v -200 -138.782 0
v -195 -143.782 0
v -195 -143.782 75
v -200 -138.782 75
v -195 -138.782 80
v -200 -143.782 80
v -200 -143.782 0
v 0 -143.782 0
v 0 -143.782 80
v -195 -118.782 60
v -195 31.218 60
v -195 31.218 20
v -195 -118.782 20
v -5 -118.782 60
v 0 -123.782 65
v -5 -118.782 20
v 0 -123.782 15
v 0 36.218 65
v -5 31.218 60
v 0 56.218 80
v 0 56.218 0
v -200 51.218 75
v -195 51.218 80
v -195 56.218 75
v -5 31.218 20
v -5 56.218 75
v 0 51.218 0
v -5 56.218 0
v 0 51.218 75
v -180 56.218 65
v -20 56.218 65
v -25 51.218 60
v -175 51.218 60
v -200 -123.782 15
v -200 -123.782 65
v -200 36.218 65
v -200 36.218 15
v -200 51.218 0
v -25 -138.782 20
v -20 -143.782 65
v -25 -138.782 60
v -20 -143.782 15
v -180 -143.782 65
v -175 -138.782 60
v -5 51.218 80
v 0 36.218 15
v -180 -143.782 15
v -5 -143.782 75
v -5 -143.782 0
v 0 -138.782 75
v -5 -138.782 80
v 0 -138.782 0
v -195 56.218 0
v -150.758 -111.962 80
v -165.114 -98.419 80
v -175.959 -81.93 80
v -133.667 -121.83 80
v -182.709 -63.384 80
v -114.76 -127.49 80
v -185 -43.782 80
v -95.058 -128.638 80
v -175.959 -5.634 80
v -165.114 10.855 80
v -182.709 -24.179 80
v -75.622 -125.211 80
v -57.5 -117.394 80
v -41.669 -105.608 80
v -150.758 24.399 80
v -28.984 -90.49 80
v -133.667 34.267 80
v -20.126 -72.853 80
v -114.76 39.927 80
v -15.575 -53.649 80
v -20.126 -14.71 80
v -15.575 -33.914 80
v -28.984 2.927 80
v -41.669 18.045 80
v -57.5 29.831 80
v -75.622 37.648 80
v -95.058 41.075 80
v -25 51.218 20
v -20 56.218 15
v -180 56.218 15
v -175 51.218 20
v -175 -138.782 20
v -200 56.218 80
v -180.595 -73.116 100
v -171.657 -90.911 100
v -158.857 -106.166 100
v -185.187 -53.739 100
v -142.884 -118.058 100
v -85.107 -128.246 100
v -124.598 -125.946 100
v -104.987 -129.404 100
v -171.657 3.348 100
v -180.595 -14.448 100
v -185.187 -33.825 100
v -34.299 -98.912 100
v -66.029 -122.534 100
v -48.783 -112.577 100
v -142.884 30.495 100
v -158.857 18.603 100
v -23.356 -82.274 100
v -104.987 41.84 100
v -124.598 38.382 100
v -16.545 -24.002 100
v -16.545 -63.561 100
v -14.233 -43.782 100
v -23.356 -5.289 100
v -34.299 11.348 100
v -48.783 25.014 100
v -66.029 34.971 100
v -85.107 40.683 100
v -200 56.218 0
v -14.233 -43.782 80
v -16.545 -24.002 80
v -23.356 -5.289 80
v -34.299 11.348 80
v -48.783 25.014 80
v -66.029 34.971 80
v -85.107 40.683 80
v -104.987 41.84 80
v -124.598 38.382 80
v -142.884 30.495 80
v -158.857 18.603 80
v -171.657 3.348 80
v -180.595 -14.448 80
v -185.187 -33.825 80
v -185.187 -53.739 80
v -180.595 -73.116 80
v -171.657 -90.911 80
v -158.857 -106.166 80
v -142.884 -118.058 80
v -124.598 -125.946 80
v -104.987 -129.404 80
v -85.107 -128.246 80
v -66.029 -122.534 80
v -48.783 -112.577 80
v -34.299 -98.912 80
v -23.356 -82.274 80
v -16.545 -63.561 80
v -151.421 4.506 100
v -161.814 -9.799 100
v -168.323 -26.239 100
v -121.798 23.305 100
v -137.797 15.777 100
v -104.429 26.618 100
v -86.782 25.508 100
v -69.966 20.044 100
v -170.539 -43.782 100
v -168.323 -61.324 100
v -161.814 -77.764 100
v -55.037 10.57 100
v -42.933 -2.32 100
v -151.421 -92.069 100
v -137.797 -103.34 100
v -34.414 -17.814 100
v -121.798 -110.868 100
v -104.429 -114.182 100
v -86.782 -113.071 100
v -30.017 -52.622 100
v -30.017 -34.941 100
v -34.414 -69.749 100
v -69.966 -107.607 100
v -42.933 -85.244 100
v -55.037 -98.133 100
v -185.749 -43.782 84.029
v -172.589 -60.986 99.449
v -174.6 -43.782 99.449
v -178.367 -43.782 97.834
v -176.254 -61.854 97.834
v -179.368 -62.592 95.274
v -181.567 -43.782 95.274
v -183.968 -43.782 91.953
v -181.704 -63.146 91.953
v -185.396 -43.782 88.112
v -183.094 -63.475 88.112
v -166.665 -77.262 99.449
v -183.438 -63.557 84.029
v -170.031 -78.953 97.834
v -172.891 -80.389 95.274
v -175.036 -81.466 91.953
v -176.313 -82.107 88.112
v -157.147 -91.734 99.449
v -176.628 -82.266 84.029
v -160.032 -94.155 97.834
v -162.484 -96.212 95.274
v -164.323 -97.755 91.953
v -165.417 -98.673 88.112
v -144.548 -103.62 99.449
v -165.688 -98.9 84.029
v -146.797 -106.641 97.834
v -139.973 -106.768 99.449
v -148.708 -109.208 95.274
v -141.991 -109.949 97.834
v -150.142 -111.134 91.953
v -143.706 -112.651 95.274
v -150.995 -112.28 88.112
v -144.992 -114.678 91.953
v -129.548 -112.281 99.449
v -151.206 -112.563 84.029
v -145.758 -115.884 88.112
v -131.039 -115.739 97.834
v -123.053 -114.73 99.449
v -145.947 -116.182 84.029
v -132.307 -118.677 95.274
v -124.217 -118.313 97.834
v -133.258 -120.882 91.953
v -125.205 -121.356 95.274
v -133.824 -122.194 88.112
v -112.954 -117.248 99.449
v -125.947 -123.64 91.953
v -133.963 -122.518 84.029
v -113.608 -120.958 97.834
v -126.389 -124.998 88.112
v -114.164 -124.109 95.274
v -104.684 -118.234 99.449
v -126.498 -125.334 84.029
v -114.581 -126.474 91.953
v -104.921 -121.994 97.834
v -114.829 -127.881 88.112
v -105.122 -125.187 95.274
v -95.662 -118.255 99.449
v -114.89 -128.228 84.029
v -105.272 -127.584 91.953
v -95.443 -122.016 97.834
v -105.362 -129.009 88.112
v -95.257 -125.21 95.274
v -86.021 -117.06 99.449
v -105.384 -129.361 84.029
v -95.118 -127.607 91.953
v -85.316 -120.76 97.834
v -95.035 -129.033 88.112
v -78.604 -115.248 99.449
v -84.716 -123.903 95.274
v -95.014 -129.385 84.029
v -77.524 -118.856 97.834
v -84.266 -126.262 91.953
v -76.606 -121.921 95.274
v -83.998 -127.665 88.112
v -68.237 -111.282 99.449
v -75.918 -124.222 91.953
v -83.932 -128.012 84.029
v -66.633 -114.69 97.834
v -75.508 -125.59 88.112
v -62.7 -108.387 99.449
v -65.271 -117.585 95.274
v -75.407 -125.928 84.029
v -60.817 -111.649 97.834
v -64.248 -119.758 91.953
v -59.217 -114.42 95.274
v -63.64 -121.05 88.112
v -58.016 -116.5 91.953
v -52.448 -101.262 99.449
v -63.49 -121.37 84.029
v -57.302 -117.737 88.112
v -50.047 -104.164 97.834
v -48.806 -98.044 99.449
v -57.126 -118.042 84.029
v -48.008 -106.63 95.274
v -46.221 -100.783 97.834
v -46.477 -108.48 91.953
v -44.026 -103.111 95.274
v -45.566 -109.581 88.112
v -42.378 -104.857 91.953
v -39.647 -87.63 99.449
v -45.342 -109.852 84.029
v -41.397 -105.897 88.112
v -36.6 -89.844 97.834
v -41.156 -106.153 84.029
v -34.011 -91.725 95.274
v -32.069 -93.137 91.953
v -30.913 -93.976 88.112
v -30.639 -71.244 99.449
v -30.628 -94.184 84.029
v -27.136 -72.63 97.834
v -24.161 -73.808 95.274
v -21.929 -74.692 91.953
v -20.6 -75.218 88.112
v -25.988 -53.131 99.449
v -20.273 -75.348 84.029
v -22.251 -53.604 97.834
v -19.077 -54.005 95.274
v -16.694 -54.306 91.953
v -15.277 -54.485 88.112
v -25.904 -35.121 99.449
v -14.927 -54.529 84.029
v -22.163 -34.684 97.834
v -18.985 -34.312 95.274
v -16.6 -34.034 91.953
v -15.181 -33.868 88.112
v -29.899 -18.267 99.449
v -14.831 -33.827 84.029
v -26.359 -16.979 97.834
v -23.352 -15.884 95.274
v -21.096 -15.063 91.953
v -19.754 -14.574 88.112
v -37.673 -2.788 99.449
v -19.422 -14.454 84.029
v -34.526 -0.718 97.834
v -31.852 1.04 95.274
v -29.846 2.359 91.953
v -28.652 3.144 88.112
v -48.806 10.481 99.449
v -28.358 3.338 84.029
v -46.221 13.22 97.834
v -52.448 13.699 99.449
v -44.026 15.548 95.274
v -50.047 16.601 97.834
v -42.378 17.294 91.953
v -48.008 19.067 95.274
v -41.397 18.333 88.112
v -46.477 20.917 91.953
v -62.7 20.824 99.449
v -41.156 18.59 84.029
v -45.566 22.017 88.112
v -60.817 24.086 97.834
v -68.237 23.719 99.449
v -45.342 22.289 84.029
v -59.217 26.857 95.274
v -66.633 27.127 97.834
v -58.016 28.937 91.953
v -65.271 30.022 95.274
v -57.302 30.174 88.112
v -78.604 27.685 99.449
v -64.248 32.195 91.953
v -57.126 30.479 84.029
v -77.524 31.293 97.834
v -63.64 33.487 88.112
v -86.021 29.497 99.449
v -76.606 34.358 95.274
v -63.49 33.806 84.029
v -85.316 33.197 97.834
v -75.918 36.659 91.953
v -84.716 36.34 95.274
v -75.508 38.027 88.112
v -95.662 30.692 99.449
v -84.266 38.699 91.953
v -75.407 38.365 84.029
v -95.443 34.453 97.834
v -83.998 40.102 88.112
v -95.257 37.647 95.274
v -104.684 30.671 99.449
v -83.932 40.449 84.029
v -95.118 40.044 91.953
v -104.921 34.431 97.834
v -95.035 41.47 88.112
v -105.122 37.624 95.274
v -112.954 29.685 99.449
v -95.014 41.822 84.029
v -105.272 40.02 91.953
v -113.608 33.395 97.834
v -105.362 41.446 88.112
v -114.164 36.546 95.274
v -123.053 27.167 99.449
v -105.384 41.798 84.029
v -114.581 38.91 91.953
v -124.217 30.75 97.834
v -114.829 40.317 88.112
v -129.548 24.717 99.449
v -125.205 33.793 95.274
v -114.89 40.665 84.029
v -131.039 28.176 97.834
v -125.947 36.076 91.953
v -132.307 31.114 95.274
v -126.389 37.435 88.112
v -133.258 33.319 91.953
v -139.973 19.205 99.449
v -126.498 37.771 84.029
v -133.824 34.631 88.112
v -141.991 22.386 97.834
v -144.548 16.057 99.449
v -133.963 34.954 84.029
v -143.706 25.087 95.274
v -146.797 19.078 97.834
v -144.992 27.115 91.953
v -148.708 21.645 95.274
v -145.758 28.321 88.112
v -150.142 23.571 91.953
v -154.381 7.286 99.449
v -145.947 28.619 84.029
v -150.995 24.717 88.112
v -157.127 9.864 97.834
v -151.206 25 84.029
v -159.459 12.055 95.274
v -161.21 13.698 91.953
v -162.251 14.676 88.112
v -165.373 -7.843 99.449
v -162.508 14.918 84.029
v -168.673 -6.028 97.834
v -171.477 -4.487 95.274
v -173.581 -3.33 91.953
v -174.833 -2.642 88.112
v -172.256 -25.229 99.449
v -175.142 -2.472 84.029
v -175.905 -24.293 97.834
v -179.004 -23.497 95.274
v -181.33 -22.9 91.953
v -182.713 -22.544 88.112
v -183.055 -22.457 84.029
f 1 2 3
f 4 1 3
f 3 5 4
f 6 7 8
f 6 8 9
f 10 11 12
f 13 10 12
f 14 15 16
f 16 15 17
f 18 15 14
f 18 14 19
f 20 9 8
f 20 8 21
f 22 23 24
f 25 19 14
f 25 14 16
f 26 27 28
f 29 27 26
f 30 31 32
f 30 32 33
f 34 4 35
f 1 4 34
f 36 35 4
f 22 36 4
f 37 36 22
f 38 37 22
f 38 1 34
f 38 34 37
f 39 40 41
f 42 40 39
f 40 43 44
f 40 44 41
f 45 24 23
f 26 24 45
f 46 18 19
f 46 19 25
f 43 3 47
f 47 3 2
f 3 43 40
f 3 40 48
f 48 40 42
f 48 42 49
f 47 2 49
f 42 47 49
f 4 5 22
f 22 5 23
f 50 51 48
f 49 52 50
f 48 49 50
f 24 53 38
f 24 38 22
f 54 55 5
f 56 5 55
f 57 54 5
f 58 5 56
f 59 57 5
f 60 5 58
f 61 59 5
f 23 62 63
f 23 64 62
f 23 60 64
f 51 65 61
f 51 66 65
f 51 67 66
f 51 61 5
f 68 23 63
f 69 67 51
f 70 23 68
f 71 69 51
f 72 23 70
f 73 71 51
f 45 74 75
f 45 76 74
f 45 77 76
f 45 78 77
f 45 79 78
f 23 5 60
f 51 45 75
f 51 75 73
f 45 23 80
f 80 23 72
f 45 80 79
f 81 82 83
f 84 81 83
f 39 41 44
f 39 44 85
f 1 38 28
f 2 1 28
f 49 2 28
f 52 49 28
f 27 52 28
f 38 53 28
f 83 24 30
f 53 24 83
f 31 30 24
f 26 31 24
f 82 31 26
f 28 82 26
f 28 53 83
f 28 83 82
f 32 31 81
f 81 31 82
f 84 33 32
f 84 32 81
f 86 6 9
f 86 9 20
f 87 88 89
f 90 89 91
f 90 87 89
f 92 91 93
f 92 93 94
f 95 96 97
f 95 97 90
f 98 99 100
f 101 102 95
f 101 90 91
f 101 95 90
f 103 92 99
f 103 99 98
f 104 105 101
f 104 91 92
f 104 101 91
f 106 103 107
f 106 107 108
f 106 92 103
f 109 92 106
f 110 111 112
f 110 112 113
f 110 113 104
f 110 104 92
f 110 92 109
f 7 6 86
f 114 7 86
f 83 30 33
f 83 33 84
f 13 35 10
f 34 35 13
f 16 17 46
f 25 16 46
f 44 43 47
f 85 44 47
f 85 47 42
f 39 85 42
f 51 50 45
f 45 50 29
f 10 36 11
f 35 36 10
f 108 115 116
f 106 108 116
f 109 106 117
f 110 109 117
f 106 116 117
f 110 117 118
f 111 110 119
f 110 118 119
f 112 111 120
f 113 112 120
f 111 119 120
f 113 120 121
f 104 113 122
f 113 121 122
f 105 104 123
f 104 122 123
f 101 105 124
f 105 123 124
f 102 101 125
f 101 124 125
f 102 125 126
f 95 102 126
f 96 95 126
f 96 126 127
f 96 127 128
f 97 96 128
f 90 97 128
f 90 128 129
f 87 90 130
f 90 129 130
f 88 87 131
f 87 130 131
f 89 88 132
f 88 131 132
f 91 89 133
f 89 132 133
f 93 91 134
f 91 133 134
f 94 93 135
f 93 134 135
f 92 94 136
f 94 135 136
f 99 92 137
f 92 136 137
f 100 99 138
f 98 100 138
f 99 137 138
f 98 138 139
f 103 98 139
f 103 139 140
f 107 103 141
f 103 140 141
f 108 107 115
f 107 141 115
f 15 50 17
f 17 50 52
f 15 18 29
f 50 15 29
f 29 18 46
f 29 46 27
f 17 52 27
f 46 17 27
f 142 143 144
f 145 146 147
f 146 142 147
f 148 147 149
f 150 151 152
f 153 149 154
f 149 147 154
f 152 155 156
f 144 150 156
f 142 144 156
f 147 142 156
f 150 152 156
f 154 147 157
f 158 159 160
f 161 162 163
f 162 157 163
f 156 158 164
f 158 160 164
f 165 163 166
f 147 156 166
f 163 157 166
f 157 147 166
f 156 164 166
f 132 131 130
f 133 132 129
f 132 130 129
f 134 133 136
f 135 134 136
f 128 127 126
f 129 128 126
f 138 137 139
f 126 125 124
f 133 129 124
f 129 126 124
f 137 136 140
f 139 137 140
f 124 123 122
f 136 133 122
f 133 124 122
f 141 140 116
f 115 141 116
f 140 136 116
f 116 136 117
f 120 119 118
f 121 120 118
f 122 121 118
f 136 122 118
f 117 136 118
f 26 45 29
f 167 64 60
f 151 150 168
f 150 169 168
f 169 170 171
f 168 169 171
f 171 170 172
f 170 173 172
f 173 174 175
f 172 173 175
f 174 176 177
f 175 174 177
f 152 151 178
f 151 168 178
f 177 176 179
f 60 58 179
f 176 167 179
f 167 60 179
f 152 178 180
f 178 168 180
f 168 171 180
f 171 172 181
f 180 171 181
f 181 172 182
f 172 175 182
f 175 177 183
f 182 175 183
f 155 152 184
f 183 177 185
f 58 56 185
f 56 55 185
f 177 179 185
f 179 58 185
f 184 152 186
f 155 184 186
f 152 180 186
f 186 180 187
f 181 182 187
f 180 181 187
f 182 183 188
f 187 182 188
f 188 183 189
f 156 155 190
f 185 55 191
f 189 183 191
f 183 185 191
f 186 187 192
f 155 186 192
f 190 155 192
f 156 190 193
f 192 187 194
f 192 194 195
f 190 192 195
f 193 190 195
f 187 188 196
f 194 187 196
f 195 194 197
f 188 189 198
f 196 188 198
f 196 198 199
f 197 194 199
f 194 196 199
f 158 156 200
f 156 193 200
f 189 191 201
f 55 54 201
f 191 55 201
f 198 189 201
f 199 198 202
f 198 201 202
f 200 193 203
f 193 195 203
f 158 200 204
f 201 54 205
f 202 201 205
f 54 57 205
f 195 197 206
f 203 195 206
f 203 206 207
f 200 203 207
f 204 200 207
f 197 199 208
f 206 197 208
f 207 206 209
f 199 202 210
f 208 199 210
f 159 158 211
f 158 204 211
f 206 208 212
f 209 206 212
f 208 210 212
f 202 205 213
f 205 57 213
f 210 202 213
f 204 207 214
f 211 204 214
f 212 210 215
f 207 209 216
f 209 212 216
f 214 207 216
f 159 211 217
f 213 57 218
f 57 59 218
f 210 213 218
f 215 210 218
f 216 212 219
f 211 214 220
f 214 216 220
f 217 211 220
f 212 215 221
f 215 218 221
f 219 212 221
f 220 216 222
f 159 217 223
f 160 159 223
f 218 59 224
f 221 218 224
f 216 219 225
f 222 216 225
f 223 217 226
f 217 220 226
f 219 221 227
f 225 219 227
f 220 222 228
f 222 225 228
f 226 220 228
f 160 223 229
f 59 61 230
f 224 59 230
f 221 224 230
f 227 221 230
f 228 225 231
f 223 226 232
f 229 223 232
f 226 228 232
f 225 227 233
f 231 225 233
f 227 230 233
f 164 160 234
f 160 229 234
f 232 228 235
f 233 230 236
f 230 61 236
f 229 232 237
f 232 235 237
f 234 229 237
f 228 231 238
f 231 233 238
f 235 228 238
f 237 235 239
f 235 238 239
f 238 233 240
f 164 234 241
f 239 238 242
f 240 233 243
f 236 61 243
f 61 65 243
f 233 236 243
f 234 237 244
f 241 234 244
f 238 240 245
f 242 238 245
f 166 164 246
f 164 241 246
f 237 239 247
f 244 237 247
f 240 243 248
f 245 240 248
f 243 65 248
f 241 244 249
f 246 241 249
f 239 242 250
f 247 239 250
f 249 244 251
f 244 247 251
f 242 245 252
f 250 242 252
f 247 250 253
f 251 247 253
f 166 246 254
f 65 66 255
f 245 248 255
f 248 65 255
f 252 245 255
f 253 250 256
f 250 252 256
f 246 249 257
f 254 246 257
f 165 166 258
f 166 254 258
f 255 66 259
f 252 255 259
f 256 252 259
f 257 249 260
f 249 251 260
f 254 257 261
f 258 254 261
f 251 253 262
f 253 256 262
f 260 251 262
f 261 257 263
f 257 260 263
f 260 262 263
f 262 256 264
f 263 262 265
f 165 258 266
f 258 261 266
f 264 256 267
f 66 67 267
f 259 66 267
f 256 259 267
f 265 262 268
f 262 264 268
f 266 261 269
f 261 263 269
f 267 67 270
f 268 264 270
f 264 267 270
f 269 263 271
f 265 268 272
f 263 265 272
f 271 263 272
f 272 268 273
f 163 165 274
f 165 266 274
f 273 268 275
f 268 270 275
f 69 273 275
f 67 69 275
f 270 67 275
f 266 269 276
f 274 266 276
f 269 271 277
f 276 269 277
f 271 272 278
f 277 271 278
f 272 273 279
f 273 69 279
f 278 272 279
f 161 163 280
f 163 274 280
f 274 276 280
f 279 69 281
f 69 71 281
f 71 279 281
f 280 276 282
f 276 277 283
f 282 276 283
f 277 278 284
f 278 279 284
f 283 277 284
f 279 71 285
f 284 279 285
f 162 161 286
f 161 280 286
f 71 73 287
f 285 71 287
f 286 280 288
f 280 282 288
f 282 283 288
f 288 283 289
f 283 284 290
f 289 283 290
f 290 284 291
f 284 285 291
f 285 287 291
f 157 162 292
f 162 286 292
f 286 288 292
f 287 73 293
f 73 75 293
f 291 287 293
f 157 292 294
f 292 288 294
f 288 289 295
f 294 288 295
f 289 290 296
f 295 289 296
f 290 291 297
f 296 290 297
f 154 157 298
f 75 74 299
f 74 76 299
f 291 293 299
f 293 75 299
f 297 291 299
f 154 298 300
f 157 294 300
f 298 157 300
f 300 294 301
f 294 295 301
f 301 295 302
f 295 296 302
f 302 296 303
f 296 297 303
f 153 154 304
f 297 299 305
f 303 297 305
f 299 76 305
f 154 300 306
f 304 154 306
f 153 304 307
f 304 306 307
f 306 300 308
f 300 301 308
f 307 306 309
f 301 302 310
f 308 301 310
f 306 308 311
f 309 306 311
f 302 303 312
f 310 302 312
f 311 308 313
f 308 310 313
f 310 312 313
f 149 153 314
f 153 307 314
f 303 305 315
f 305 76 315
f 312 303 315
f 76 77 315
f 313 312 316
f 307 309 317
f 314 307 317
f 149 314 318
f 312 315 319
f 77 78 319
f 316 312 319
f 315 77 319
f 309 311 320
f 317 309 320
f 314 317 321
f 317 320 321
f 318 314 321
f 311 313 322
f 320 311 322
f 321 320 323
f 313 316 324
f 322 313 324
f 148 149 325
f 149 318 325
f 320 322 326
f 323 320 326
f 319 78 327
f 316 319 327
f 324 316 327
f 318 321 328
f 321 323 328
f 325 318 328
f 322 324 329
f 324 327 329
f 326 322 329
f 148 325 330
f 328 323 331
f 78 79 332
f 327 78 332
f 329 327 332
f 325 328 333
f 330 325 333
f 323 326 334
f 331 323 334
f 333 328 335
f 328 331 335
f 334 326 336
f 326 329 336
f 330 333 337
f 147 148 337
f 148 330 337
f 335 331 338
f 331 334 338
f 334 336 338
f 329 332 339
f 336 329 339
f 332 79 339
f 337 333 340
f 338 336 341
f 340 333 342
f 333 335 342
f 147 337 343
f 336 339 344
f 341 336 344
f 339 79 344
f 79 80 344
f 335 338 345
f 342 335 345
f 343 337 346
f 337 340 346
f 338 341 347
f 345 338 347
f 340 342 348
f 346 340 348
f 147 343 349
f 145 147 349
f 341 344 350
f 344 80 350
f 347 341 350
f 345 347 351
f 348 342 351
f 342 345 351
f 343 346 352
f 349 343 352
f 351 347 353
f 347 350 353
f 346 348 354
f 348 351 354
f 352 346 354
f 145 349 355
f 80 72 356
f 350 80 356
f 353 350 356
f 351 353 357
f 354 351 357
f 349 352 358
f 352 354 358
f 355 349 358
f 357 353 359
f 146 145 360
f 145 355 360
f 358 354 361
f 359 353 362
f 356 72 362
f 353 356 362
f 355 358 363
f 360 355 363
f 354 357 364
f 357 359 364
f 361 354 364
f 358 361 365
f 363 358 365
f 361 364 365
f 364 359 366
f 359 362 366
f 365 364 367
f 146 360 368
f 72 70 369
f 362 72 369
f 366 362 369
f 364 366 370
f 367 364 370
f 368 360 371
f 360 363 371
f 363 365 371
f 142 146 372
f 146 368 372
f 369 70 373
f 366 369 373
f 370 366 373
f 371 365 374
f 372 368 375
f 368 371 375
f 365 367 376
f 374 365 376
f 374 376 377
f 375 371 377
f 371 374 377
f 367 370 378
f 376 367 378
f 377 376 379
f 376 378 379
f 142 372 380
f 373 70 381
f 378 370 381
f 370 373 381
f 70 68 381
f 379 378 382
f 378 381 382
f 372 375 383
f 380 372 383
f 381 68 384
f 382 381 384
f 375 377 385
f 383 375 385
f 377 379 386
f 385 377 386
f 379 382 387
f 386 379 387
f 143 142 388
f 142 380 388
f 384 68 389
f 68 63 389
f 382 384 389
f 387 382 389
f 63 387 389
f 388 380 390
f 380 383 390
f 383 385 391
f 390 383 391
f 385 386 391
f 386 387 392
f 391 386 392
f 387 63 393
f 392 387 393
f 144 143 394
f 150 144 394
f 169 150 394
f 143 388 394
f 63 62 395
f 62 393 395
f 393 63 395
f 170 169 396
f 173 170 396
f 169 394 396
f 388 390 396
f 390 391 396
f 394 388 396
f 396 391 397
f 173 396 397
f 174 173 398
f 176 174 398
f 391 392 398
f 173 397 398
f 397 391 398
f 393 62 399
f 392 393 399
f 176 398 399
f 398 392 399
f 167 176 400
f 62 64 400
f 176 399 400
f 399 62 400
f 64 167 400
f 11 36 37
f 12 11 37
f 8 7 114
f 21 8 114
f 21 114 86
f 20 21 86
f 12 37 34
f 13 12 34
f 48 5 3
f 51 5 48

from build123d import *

# Parameters (mm, degrees)
SCHIZZO2_W                            = 200
SCHIZZO2_H                            = 200
ESTRUSIONE_ESTRUSIONE1_DEPTH          = 80
CORPO_SPOSTA_COPIA1_START             = -200
CORPO_SPOSTA_COPIA1_OUTLINE_W         = 200
CORPO_SPOSTA_COPIA1_OUTLINE_H         = 80
CORPO_SPOSTA_COPIA1_DEPTH             = 200
SCHIZZO5_W                            = 50
SCHIZZO5_H                            = 160
TAGLIO_ESTRUSIONE1_DEPTH              = 5
TAGLIO_ESTRUSIONE1_DRAFT              = -45
RIPETIZIONECIRCOLARE2_COPY_1_SKETCH_W = 50
RIPETIZIONECIRCOLARE2_COPY_1_SKETCH_H = 160
RIPETIZIONECIRCOLARE2_COPY_1_DEPTH    = 5
RIPETIZIONECIRCOLARE2_COPY_1_DRAFT    = -45
RIPETIZIONECIRCOLARE2_COPY_2_SKETCH_W = 50
RIPETIZIONECIRCOLARE2_COPY_2_SKETCH_H = 160
RIPETIZIONECIRCOLARE2_COPY_2_DEPTH    = 5
RIPETIZIONECIRCOLARE2_COPY_2_DRAFT    = -45
RIPETIZIONECIRCOLARE2_COPY_3_SKETCH_W = 50
RIPETIZIONECIRCOLARE2_COPY_3_SKETCH_H = 160
RIPETIZIONECIRCOLARE2_COPY_3_DEPTH    = 5
RIPETIZIONECIRCOLARE2_COPY_3_DRAFT    = -45
SMUSSO1_SIZE                          = 5
SCHIZZO7_R                            = 85.767086788
ESTRUSIONE_ESTRUSIONE2_DEPTH          = 20


# Read off the part's stored shape, not the designer's step: Corpo-Sposta/copia1
with BuildPart() as part:
    # Schizzo2 → Estrusione-Estrusione1 (new body)
    with BuildSketch(Plane.XY):
        with Locations((-100, -43.781574918)):
            Rectangle(SCHIZZO2_W, SCHIZZO2_H)
    extrude(amount=ESTRUSIONE_ESTRUSIONE1_DEPTH)

    # Schizzo4 → Rivoluzione3 (revolve)
    with BuildSketch(Plane(origin=(0, -43.781574918, 0), x_dir=(-1, 0, 0), z_dir=(0, 1, 0)), mode=Mode.PRIVATE) as rivoluzione3_sk:
        with BuildLine():
            Line((100, 100), (29.460733668, 100))
            ThreePointArc((29.460733668, 100), (17.120628135, 93.694528522), (15, 80))
            Line((15, 80), (100, 80))
            Line((100, 80), (100, 100))
        make_face()
    revolve(rivoluzione3_sk.sketch.rotate(Axis((-100, -43.781574918, 80), (0, 0, 1)), 180), axis=Axis((-100, -43.781574918, 80), (0, 0, 1)))


with BuildPart() as body_2:
    # Corpo-Sposta/copia1 outline → Corpo-Sposta/copia1 (new body)
    with BuildSketch(Plane.YZ.offset(CORPO_SPOSTA_COPIA1_START)):
        with Locations((-43.781574918, 40)):
            Rectangle(CORPO_SPOSTA_COPIA1_OUTLINE_W, CORPO_SPOSTA_COPIA1_OUTLINE_H)
    extrude(amount=CORPO_SPOSTA_COPIA1_DEPTH)


with BuildPart() as taglio_estrusione1_tool:
    # Schizzo5 → Taglio-Estrusione1 (with draft: the straight prism first)
    with BuildSketch(Plane(origin=(0, 0, 0), x_dir=(0, 0, -1), z_dir=(1, 0, 0))):
        with Locations((-40, -43.781574918)):
            Rectangle(SCHIZZO5_W, SCHIZZO5_H)
    extrude(amount=-TAGLIO_ESTRUSIONE1_DEPTH)
    # Taglio-Estrusione1: the draft: its side faces are tilted about the plane it starts from
    taglio_estrusione1_sides = [taglio_estrusione1_tool.faces().sort_by_distance(p)[0] for p in [
        (-2.5, -123.781574918, 40),
        (-2.5, -43.781574918, 15),
        (-2.5, 36.218425082, 40),
        (-2.5, -43.781574918, 65),
    ]]
    draft(taglio_estrusione1_sides, Plane(origin=(0, 0, 0), x_dir=(0, 0, -1), z_dir=(1, 0, 0)), TAGLIO_ESTRUSIONE1_DRAFT)


with BuildPart() as part_1:
    add(part.part)

    # Taglio-Estrusione1: cut by taglio_estrusione1_tool
    add(taglio_estrusione1_tool.part, mode=Mode.SUBTRACT)


with BuildPart() as ripetizionecircolare2_copy_1_tool:
    # RipetizioneCircolare2 copy 1 sketch → RipetizioneCircolare2 copy 1 (with draft: the straight prism first)
    with BuildSketch(Plane(origin=(-143.781574918, 56.218425082, 0), x_dir=(0, 0, -1), z_dir=(0, 1, 0))):
        with Locations((-40, -43.781574918)):
            Rectangle(RIPETIZIONECIRCOLARE2_COPY_1_SKETCH_W, RIPETIZIONECIRCOLARE2_COPY_1_SKETCH_H)
    extrude(amount=-RIPETIZIONECIRCOLARE2_COPY_1_DEPTH)
    # RipetizioneCircolare2 copy 1: the draft: its side faces are tilted about the plane it starts from
    ripetizionecircolare2_copy_1_sides = [ripetizionecircolare2_copy_1_tool.faces().sort_by_distance(p)[0] for p in [
        (-20, 53.718425082, 40),
        (-100, 53.718425082, 15),
        (-180, 53.718425082, 40),
        (-100, 53.718425082, 65),
    ]]
    draft(ripetizionecircolare2_copy_1_sides, Plane(origin=(-143.781574918, 56.218425082, 0), x_dir=(0, 0, -1), z_dir=(0, 1, 0)), RIPETIZIONECIRCOLARE2_COPY_1_DRAFT)


with BuildPart() as part_2:
    add(part_1.part)

    # RipetizioneCircolare2 copy 1: cut by ripetizionecircolare2_copy_1_tool
    add(ripetizionecircolare2_copy_1_tool.part, mode=Mode.SUBTRACT)


with BuildPart() as ripetizionecircolare2_copy_2_tool:
    # RipetizioneCircolare2 copy 2 sketch → RipetizioneCircolare2 copy 2 (with draft: the straight prism first)
    with BuildSketch(Plane(origin=(-200, -87.563149837, 0), x_dir=(0, 0, -1), z_dir=(-1, 0, 0))):
        with Locations((-40, -43.781574918)):
            Rectangle(RIPETIZIONECIRCOLARE2_COPY_2_SKETCH_W, RIPETIZIONECIRCOLARE2_COPY_2_SKETCH_H)
    extrude(amount=-RIPETIZIONECIRCOLARE2_COPY_2_DEPTH)
    # RipetizioneCircolare2 copy 2: the draft: its side faces are tilted about the plane it starts from
    ripetizionecircolare2_copy_2_sides = [ripetizionecircolare2_copy_2_tool.faces().sort_by_distance(p)[0] for p in [
        (-197.5, 36.218425081, 40),
        (-197.5, -43.781574919, 15),
        (-197.5, -123.781574919, 40),
        (-197.5, -43.781574919, 65),
    ]]
    draft(ripetizionecircolare2_copy_2_sides, Plane(origin=(-200, -87.563149837, 0), x_dir=(0, 0, -1), z_dir=(-1, 0, 0)), RIPETIZIONECIRCOLARE2_COPY_2_DRAFT)


with BuildPart() as part_3:
    add(part_2.part)

    # RipetizioneCircolare2 copy 2: cut by ripetizionecircolare2_copy_2_tool
    add(ripetizionecircolare2_copy_2_tool.part, mode=Mode.SUBTRACT)


with BuildPart() as ripetizionecircolare2_copy_3_tool:
    # RipetizioneCircolare2 copy 3 sketch → RipetizioneCircolare2 copy 3 (with draft: the straight prism first)
    with BuildSketch(Plane(origin=(-56.218425082, -143.781574918, 0), x_dir=(0, 0, -1), z_dir=(0, -1, 0))):
        with Locations((-40, -43.781574918)):
            Rectangle(RIPETIZIONECIRCOLARE2_COPY_3_SKETCH_W, RIPETIZIONECIRCOLARE2_COPY_3_SKETCH_H)
    extrude(amount=-RIPETIZIONECIRCOLARE2_COPY_3_DEPTH)
    # RipetizioneCircolare2 copy 3: the draft: its side faces are tilted about the plane it starts from
    ripetizionecircolare2_copy_3_sides = [ripetizionecircolare2_copy_3_tool.faces().sort_by_distance(p)[0] for p in [
        (-180, -141.281574918, 40),
        (-100, -141.281574918, 15),
        (-20, -141.281574918, 40),
        (-100, -141.281574918, 65),
    ]]
    draft(ripetizionecircolare2_copy_3_sides, Plane(origin=(-56.218425082, -143.781574918, 0), x_dir=(0, 0, -1), z_dir=(0, -1, 0)), RIPETIZIONECIRCOLARE2_COPY_3_DRAFT)


with BuildPart() as part_4:
    add(part_3.part)

    # RipetizioneCircolare2 copy 3: cut by ripetizionecircolare2_copy_3_tool
    add(ripetizionecircolare2_copy_3_tool.part, mode=Mode.SUBTRACT)

    # Smusso1
    smusso1_edges = [part_4.edges().sort_by_distance(p)[0] for p in [
        (-200, -43.781574918, 80),
        (-100, -143.781574918, 80),
        (0, -43.781574918, 80),
        (-100, 56.218425082, 80),
        (0, -143.781574918, 40),
        (-200, -143.781574918, 40),
        (-200, 56.218425082, 40),
        (0, 56.218425082, 40),
    ]]
    chamfer(smusso1_edges, length=SMUSSO1_SIZE)


with BuildPart() as body_3:
    # Schizzo7 → Estrusione-Estrusione2 (new body)
    with BuildSketch(Plane.XY.offset(80)):
        with Locations((-100, -43.781574918)):
            Circle(SCHIZZO7_R)
    extrude(amount=ESTRUSIONE_ESTRUSIONE2_DEPTH)


solid = Compound([body_2.part, part_4.part, body_3.part])
